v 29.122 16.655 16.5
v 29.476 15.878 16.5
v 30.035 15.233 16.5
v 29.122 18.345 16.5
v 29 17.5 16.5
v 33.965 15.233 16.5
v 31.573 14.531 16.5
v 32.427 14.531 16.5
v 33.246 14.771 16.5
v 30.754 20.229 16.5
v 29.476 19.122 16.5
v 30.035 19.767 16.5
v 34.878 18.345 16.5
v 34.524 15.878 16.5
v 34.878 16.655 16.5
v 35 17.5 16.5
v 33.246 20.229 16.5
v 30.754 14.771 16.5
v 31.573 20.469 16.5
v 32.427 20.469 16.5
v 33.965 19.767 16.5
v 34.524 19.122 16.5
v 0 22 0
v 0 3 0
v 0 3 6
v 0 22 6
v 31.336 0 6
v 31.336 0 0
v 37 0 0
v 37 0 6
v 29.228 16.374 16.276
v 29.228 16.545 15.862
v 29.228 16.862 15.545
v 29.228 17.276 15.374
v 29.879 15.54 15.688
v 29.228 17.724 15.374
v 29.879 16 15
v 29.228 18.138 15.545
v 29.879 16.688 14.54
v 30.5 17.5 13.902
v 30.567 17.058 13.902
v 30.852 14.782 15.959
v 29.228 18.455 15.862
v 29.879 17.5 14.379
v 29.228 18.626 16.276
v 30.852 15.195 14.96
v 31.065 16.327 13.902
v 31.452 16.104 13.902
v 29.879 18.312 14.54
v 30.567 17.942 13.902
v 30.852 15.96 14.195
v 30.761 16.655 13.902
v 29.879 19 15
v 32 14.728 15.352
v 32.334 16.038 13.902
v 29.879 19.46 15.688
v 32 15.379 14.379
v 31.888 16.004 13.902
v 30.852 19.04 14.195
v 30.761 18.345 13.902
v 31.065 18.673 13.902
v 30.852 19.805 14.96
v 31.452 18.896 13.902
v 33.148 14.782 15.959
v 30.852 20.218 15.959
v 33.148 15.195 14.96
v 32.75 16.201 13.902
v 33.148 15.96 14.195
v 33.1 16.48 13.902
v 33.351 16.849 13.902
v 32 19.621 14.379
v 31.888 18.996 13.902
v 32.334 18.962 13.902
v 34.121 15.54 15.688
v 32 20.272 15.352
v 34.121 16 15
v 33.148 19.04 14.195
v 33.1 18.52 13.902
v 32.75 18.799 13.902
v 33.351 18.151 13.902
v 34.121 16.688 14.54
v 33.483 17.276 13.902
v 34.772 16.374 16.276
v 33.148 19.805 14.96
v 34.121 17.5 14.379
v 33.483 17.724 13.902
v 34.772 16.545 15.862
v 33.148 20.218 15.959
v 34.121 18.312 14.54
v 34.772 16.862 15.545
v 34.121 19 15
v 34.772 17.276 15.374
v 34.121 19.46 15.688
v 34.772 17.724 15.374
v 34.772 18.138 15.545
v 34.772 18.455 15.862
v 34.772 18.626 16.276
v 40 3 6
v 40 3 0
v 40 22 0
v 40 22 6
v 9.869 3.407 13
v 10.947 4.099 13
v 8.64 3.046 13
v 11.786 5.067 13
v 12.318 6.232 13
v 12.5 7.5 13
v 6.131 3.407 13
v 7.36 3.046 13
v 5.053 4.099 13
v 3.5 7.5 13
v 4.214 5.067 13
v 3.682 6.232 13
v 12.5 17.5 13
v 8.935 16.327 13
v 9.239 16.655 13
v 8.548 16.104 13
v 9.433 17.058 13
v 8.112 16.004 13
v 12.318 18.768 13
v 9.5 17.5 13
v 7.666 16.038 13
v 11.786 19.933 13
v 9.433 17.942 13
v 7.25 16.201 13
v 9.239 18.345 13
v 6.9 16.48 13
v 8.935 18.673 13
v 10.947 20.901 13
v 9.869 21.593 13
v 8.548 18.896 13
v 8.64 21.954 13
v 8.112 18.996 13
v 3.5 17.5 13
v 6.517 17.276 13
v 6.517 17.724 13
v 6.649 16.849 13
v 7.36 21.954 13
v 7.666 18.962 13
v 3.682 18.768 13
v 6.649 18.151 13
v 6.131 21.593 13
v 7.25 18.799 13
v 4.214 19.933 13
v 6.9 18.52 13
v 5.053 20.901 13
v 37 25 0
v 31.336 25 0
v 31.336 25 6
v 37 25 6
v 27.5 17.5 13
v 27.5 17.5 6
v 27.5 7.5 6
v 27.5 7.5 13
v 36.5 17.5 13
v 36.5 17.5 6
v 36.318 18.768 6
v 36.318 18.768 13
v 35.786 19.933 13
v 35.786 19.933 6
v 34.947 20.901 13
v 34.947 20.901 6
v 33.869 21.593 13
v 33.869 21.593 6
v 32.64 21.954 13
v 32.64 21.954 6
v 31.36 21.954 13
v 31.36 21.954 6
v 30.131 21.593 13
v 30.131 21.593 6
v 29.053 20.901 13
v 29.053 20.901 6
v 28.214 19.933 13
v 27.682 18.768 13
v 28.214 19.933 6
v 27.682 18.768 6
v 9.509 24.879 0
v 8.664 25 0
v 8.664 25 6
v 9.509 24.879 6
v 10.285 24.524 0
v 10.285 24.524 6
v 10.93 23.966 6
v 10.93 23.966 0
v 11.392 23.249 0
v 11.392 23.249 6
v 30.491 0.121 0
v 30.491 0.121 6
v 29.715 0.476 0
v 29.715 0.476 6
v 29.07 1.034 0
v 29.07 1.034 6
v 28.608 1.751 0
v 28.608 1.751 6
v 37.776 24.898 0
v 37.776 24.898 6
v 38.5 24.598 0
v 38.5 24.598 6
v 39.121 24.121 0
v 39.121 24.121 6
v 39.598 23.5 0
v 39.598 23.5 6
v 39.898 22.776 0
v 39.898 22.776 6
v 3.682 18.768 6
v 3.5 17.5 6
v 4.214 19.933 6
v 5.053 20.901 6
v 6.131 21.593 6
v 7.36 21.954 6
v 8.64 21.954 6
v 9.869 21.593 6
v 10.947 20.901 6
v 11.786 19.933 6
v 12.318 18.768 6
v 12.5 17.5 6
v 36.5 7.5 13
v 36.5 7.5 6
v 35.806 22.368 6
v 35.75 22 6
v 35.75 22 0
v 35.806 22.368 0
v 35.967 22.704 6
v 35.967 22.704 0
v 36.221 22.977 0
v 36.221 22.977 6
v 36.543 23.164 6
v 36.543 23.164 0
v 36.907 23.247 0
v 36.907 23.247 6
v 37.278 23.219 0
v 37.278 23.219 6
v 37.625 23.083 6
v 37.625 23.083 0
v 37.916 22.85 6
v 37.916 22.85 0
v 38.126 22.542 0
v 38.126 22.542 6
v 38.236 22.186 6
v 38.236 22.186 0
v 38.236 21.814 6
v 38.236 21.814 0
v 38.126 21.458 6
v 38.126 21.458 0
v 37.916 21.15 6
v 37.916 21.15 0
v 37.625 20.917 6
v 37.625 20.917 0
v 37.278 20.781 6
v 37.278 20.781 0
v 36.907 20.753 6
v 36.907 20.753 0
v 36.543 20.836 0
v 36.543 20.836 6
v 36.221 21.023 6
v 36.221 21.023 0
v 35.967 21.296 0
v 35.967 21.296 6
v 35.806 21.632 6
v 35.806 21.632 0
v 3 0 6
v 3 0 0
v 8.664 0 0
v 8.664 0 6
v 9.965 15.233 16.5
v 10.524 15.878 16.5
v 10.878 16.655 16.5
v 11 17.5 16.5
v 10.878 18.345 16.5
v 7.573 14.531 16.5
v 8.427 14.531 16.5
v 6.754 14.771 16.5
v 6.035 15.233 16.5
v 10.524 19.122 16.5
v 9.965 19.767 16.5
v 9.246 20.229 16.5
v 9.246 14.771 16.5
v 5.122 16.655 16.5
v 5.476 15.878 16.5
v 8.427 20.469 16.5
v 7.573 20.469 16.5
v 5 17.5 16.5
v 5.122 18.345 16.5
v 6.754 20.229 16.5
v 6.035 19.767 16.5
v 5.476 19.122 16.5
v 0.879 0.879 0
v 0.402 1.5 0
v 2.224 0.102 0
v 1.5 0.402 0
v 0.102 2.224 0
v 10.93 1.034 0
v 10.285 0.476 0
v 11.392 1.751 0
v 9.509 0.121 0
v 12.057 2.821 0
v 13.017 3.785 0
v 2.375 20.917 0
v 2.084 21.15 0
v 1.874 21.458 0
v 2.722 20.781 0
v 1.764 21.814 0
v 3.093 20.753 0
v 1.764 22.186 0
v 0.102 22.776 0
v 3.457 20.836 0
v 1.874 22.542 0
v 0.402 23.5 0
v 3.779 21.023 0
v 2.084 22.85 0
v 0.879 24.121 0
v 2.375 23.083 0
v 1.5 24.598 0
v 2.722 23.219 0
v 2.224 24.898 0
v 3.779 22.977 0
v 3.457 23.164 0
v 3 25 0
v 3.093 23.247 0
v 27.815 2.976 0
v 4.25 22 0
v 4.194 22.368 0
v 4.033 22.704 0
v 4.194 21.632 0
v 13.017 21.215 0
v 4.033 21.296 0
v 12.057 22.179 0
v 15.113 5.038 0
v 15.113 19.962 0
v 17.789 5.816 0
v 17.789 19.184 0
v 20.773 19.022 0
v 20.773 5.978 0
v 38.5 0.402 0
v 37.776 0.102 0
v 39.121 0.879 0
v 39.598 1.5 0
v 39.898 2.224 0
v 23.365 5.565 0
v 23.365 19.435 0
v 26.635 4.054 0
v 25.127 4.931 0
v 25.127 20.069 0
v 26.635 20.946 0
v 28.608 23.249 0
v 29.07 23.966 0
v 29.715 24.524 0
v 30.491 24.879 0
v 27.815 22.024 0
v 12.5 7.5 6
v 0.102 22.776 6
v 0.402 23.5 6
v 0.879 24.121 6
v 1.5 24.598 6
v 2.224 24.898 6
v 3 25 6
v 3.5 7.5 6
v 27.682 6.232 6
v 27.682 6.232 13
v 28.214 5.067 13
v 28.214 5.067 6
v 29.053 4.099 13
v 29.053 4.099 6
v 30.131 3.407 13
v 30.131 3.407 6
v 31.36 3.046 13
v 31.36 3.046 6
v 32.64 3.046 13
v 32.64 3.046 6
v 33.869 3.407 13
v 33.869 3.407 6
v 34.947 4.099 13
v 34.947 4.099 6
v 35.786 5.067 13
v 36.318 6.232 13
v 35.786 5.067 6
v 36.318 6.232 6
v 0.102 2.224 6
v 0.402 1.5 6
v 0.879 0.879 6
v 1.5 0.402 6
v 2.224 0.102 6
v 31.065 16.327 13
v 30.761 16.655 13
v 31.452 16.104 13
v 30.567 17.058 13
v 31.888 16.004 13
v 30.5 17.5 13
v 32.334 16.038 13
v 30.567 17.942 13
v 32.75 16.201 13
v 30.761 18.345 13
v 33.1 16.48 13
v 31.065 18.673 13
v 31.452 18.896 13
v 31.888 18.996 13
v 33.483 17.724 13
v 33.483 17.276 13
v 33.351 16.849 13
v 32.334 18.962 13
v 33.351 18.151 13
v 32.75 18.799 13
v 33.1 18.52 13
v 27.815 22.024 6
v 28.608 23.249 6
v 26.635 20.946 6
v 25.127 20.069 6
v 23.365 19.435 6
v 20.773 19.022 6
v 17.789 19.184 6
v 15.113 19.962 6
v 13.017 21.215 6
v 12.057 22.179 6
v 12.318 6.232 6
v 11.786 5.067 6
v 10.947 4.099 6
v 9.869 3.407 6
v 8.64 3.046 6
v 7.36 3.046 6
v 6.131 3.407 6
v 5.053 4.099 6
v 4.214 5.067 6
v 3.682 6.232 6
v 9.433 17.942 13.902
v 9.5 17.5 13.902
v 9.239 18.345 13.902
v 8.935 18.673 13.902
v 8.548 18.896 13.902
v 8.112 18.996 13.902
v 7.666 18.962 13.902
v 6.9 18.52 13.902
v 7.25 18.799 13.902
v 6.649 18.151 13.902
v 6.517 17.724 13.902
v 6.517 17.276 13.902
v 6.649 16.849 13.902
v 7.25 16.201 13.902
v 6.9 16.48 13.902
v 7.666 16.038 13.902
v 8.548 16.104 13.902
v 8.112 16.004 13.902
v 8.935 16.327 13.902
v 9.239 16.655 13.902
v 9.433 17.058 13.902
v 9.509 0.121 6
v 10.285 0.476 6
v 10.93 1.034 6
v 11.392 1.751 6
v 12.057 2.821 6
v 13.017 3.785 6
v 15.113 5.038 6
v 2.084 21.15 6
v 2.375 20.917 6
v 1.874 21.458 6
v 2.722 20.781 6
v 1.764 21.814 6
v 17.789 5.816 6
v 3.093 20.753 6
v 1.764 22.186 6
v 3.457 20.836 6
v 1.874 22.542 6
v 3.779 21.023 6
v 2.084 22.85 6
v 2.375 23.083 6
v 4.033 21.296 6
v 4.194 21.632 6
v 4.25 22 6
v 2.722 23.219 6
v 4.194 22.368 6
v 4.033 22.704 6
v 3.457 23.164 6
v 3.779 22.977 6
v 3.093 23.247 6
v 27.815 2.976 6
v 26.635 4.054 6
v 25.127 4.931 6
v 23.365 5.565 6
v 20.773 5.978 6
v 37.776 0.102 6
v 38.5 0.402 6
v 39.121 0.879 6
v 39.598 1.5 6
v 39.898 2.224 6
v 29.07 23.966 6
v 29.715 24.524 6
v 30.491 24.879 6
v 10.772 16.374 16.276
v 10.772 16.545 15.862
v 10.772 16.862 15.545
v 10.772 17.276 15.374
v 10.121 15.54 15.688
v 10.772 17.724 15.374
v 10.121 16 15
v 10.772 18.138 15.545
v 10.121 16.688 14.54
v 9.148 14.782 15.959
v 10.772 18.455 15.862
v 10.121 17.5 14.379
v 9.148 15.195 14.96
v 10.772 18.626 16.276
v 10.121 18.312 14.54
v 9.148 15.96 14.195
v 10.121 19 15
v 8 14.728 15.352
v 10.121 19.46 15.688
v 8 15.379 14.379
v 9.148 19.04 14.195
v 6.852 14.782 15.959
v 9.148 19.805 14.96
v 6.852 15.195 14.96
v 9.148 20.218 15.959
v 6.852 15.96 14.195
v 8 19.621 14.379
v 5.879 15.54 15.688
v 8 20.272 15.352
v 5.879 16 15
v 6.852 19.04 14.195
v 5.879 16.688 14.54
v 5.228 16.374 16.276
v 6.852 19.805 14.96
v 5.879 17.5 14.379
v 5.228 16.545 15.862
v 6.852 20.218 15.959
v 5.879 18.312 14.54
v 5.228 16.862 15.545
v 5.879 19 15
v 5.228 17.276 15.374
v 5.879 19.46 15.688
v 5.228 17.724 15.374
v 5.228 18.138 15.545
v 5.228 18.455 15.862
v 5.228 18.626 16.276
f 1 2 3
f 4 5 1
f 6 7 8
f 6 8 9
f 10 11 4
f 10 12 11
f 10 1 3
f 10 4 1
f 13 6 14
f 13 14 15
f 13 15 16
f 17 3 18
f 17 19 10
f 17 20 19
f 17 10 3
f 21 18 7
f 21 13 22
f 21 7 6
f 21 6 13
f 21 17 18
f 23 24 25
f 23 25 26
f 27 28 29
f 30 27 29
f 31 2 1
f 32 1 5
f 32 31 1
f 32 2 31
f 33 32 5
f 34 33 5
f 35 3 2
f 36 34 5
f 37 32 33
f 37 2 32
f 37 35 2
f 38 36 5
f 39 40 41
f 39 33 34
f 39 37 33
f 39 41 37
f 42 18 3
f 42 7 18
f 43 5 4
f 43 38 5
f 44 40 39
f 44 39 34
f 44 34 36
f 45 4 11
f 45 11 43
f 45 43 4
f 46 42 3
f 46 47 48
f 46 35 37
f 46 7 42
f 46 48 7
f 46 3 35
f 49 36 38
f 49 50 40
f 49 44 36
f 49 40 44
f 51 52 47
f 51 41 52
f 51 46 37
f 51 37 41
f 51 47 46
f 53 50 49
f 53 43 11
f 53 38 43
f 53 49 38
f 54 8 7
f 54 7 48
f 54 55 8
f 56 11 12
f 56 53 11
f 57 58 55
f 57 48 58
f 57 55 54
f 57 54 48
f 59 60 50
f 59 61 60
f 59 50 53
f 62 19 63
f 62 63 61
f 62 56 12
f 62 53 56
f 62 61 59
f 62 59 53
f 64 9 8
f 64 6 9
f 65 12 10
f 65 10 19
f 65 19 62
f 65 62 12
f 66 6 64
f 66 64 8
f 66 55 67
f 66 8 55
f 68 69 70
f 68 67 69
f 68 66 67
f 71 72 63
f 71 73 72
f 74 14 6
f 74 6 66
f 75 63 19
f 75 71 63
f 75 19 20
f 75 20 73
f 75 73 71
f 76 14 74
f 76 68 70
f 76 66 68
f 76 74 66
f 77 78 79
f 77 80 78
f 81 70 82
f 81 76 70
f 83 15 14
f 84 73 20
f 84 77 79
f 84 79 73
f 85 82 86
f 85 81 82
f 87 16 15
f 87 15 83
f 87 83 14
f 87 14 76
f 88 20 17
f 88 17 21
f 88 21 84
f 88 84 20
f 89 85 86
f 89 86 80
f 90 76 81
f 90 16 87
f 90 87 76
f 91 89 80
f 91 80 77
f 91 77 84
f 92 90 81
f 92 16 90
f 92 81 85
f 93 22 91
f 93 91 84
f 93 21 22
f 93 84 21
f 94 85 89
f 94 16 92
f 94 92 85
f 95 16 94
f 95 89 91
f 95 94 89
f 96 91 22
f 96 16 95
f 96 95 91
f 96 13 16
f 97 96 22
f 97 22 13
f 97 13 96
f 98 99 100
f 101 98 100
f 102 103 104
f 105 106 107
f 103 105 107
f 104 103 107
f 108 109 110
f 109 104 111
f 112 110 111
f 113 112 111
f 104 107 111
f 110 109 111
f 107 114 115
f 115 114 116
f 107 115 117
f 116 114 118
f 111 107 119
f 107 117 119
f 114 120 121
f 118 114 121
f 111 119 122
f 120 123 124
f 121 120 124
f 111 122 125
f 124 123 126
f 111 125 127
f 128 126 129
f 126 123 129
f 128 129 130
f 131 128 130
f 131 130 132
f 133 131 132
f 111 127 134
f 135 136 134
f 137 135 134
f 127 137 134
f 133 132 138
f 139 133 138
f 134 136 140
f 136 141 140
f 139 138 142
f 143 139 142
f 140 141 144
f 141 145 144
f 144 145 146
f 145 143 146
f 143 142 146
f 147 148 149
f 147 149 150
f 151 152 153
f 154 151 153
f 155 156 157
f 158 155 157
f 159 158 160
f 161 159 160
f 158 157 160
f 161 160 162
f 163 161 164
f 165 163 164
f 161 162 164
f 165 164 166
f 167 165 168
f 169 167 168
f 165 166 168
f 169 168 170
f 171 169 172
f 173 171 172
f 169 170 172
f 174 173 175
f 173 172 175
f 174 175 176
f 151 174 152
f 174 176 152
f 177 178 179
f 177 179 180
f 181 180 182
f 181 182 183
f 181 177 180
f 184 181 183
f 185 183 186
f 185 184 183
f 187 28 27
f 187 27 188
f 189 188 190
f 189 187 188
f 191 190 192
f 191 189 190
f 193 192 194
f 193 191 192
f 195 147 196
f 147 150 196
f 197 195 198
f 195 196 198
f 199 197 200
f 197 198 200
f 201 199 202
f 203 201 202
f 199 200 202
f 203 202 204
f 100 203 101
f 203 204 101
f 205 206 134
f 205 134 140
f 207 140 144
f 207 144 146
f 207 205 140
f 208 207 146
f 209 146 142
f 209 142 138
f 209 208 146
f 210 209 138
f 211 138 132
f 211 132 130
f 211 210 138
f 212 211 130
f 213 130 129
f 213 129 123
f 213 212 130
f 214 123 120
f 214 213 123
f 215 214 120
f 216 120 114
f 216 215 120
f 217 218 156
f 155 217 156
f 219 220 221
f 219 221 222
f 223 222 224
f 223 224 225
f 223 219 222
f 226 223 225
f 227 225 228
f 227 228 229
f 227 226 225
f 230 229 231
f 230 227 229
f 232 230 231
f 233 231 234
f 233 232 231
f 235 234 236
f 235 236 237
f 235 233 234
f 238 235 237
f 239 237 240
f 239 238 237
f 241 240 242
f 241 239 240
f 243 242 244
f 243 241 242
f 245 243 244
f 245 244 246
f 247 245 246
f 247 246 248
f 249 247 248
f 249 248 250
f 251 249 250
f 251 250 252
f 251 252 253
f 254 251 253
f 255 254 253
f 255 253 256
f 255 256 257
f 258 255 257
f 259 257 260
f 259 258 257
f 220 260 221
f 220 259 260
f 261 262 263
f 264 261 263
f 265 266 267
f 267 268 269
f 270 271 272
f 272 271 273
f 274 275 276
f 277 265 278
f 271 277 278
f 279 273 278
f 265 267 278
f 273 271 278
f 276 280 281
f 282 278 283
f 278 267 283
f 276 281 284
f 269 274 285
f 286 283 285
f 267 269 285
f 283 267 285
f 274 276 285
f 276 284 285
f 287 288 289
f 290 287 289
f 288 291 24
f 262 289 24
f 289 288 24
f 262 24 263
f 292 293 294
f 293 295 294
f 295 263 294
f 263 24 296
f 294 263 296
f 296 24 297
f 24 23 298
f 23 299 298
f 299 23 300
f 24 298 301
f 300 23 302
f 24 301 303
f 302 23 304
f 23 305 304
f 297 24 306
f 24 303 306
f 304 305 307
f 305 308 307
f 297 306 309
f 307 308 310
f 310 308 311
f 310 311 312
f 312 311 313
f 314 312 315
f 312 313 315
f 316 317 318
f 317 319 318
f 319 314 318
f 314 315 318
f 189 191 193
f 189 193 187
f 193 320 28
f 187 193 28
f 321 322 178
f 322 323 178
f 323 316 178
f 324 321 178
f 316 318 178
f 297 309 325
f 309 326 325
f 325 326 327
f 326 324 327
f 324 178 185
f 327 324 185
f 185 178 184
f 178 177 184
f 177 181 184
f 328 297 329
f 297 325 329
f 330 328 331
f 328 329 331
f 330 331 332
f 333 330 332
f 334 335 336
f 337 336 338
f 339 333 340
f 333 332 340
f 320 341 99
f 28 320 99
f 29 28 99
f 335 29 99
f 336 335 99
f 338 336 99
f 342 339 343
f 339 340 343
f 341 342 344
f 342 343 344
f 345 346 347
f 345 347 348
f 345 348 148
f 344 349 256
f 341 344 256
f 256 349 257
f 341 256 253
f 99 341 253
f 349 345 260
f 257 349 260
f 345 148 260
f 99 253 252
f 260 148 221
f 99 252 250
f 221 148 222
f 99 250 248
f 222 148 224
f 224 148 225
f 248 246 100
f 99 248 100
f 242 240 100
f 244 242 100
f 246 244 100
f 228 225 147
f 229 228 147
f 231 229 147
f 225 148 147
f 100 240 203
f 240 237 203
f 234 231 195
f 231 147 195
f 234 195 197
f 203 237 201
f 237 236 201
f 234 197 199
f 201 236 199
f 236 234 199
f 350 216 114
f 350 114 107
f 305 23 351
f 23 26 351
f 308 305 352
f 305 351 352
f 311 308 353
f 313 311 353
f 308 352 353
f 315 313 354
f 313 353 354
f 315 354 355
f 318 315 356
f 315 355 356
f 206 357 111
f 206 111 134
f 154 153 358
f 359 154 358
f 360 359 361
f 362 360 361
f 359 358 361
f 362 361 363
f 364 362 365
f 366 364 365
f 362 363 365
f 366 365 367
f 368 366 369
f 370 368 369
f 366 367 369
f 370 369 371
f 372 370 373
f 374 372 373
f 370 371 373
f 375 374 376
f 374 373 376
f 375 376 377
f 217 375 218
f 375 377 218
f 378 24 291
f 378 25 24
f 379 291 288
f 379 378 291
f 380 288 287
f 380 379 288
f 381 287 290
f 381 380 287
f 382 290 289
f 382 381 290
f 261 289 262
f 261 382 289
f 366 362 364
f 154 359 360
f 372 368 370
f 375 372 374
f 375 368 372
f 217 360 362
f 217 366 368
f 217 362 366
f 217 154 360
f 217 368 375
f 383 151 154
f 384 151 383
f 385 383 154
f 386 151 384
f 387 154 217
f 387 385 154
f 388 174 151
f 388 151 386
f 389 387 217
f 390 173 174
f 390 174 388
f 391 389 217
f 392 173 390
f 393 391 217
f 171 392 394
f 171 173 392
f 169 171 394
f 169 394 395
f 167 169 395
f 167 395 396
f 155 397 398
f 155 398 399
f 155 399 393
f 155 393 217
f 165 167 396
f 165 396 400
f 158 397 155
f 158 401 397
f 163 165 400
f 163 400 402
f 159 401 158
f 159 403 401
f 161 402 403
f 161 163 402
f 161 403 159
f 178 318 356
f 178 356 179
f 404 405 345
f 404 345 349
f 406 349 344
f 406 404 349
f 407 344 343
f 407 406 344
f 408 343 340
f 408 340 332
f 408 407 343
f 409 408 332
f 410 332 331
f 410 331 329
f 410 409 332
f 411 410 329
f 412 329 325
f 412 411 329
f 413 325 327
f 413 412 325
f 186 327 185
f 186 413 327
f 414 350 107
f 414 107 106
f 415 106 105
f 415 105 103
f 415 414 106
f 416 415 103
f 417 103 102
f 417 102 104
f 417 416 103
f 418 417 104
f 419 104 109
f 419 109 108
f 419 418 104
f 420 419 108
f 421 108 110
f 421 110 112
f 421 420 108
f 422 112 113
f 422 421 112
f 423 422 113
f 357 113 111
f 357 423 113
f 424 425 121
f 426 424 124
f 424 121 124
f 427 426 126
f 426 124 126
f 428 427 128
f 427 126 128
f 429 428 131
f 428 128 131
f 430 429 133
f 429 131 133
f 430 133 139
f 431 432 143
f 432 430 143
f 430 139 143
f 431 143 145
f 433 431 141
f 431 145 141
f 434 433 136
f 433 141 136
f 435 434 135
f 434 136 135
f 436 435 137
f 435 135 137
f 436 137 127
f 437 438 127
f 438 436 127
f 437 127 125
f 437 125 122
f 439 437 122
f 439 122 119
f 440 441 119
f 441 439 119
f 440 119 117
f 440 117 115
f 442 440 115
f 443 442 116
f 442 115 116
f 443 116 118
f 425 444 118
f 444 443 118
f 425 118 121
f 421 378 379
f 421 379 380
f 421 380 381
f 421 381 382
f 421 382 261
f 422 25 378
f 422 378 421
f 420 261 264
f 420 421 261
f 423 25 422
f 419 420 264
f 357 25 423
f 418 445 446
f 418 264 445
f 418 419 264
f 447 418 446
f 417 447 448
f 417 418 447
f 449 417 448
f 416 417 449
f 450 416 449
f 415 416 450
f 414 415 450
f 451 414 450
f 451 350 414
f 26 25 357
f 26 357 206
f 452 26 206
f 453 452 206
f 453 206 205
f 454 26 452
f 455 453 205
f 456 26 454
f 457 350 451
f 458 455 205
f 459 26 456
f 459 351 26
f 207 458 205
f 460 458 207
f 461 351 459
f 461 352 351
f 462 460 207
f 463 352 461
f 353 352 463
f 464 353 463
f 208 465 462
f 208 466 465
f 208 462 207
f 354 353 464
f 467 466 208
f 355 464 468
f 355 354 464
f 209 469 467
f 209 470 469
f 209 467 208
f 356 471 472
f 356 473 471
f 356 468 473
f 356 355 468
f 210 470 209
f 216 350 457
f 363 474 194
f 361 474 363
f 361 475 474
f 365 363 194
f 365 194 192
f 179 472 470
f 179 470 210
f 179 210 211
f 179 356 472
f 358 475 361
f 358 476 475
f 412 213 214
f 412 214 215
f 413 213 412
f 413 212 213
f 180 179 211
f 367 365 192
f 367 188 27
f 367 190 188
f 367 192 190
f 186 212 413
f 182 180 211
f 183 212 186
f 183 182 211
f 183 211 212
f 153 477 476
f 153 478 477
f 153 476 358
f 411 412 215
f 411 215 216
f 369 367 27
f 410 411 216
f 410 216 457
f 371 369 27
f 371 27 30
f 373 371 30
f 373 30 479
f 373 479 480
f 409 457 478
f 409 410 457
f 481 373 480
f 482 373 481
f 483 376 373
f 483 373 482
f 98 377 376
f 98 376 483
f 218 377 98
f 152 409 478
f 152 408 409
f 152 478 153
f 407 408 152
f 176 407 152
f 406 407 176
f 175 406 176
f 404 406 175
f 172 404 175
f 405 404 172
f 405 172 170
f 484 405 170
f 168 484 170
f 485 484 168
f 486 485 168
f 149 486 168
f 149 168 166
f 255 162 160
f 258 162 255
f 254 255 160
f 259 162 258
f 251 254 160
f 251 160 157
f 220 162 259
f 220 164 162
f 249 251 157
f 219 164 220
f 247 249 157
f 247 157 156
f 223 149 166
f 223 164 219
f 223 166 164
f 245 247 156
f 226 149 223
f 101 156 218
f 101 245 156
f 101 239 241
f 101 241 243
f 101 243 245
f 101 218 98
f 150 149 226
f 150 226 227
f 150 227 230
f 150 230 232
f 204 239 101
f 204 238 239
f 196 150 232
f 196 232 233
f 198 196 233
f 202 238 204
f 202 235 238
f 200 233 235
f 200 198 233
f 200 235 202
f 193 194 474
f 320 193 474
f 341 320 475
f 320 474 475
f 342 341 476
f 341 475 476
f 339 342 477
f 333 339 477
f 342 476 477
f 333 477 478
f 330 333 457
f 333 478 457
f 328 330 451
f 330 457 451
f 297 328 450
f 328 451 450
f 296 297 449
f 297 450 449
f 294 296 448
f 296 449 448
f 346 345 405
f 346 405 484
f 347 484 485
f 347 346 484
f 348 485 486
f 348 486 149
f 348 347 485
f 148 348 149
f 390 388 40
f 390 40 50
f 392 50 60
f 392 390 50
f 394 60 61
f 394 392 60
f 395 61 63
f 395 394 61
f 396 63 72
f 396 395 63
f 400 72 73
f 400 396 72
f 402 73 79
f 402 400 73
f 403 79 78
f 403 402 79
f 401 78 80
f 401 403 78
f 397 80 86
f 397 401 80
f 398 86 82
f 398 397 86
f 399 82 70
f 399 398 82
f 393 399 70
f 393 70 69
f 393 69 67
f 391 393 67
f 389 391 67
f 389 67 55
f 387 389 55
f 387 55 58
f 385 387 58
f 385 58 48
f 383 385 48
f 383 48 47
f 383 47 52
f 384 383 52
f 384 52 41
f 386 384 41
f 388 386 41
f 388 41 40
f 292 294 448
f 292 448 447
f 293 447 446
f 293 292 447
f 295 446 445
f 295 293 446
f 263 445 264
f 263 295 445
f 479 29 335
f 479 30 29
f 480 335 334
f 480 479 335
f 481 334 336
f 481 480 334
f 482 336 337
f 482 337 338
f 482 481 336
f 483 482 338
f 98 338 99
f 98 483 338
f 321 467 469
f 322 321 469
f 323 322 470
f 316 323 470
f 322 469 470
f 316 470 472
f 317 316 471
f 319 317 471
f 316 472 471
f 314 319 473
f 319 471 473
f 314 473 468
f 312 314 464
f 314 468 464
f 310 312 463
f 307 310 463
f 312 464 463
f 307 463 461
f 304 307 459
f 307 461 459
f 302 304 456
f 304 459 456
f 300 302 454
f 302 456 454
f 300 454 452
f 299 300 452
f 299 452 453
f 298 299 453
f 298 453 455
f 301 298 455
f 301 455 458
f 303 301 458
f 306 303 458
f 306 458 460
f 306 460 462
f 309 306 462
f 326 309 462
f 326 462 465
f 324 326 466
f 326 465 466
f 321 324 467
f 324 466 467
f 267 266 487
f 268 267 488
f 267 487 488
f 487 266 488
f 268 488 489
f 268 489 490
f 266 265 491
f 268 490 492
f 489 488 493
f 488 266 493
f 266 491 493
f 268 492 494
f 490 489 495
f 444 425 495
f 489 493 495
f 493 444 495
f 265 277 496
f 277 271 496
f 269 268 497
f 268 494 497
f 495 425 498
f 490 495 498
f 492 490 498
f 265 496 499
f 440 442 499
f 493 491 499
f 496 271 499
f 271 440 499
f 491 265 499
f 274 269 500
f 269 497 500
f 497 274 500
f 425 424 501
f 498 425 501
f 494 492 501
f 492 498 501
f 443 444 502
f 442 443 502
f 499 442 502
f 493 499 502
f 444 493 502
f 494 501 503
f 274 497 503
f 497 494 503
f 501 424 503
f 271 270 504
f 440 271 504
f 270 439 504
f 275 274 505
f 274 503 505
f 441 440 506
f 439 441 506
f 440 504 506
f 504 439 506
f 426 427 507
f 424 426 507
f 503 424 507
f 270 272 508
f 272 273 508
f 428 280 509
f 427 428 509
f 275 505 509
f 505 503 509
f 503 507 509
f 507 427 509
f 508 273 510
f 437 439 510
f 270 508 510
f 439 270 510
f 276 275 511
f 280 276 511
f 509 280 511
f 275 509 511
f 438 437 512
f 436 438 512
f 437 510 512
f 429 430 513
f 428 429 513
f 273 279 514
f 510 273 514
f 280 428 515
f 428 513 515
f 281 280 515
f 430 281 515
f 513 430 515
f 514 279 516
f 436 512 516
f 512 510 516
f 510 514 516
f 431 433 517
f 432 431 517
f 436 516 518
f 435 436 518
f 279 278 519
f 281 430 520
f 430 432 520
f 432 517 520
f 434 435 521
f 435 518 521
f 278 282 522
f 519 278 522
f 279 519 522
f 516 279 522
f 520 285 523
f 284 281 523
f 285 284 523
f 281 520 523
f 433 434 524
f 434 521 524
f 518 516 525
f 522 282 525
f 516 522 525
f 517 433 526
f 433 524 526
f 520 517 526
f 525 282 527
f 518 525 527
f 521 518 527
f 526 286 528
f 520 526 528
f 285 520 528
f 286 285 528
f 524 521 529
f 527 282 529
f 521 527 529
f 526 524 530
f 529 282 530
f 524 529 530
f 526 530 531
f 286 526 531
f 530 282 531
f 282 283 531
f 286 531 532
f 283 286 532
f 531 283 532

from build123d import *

# Parameters (mm, degrees)
SKIZZE1_W                       = 40
SKIZZE1_H                       = 25
AUFSATZ_LINEAR_AUSTRAGEN1_DEPTH = 6
AUFSATZ_LINEAR_AUSTRAGEN2_DEPTH = 7
SKIZZE3_R                       = 1.5
AUFSATZ_LINEAR_AUSTRAGEN3_DEPTH = 3.5
ROTATION1_ANGLE                 = 180
VERRUNDUNG1_R                   = 3
SKIZZE6_RX                      = 9
SKIZZE6_RY                      = 6
SCHNITT_LINEAR_AUSTRAGEN7_DEPTH = 6
VERRUNDUNG2_START               = -1
VERRUNDUNG2_DEPTH               = 8
VERRUNDUNG3_START               = -1
VERRUNDUNG3_DEPTH               = 8
SKIZZE7_R                       = 1.25
SCHNITT_LINEAR_AUSTRAGEN8_DEPTH = 6


with BuildPart() as part:
    # Skizze1 → Aufsatz-Linear austragen1 (new body)
    with BuildSketch(Plane.XY):
        with Locations((20, 12.5)):
            Rectangle(SKIZZE1_W, SKIZZE1_H)
    extrude(amount=AUFSATZ_LINEAR_AUSTRAGEN1_DEPTH)

    # Skizze2 → Aufsatz-Linear austragen2 (add)
    with BuildSketch(Plane.XY.offset(6)):
        with BuildLine():
            Line((12.5, 17.5), (12.5, 7.5))
            ThreePointArc((12.5, 7.5), (8, 3), (3.5, 7.5))
            Line((3.5, 7.5), (3.5, 17.5))
            ThreePointArc((3.5, 17.5), (8, 22), (12.5, 17.5))
        make_face()
    aufsatz_linear_austragen2 = extrude(amount=AUFSATZ_LINEAR_AUSTRAGEN2_DEPTH)

    # Spiegeln1: Aufsatz-Linear austragen2 across plane
    add(aufsatz_linear_austragen2.mirror(Plane.ZY.offset(-20)))

    # Skizze3 → Aufsatz-Linear austragen3 (add)
    with BuildSketch(Plane.XY.offset(13)):
        with Locations((8, 17.5)):
            Circle(SKIZZE3_R)
    aufsatz_linear_austragen3 = extrude(amount=AUFSATZ_LINEAR_AUSTRAGEN3_DEPTH)

    # Spiegeln2: Aufsatz-Linear austragen3 across plane
    add(aufsatz_linear_austragen3.mirror(Plane.ZY.offset(-20)))

    # Skizze4 → Rotation1 (revolve)
    with BuildSketch(Plane.XY.offset(16.5)):
        with BuildLine():
            Line((5, 17.5), (11, 17.5))
            ThreePointArc((11, 17.5), (8, 14.5), (5, 17.5))
        make_face()
    rotation1 = revolve(axis=Axis((5, 17.5, 16.5), (1, 0, 0)), revolution_arc=ROTATION1_ANGLE)

    # Spiegeln3: Rotation1 across plane
    add(rotation1.mirror(Plane.ZY.offset(-20)))

    # Verrundung1
    verrundung1_edges = [part.edges().sort_by_distance(p)[0] for p in [
        (0, 25, 3),
        (40, 25, 3),
        (40, 0, 3),
        (0, 0, 3),
    ]]
    fillet(verrundung1_edges, radius=VERRUNDUNG1_R)

    # Skizze6 → Schnitt-Linear austragen7 (cut)
    with BuildSketch(Plane.XY.offset(6)):
        with Locations(Location((20, 0), (0, 0, 180))):
            Ellipse(SKIZZE6_RX, SKIZZE6_RY)
    schnitt_linear_austragen7 = extrude(amount=-SCHNITT_LINEAR_AUSTRAGEN7_DEPTH, mode=Mode.SUBTRACT)

    # Verrundung2: read off the stored shape, not the designer's step
    # Verrundung2 outline → Verrundung2 (cut)
    with BuildSketch(Plane.XY.offset(VERRUNDUNG2_START)):
        with BuildLine():
            add(Edge.make_bspline(
                [(11.391923436, 1.751319232), (11, 0.89515019), (11, 0)],
                knots=[5.971053557, 5.971053557, 5.971053557, 6.283185307, 6.283185307, 6.283185307], degree=2, weights=[0.906728811, 0.94179941, 1]))
            ThreePointArc((11.391923436, 1.751319232), (10.28493687, 0.475515666), (8.664141124, 0))
            Line((8.664141124, 0), (11, 0))
        make_face()
        with BuildLine():
            ThreePointArc((31.335858876, 0), (29.71506313, 0.475515666), (28.608076564, 1.751319232))
            add(Edge.make_bspline(
                [(29, 0), (29, 0.89515019), (28.608076564, 1.751319232)],
                knots=[3.141592654, 3.141592654, 3.141592654, 3.453724403, 3.453724403, 3.453724403], degree=2, weights=[1, 0.94179941, 0.906728811]))
            Line((29, 0), (31.335858876, 0))
        make_face()
    extrude(amount=VERRUNDUNG2_DEPTH, mode=Mode.SUBTRACT)

    # Spiegeln5: Schnitt-Linear austragen7 across plane
    add(schnitt_linear_austragen7.mirror(Plane.ZX.offset(12.5)), mode=Mode.SUBTRACT)

    # Verrundung3: read off the stored shape, not the designer's step
    # Verrundung3 outline → Verrundung3 (cut)
    with BuildSketch(Plane.XY.offset(VERRUNDUNG3_START)):
        with BuildLine():
            ThreePointArc((8.664141124, 25), (10.28493687, 24.524484334), (11.391923436, 23.248680768))
            add(Edge.make_bspline(
                [(11.391923436, 23.248680768), (11, 24.10484981), (11, 25)],
                knots=[5.971053557, 5.971053557, 5.971053557, 6.283185307, 6.283185307, 6.283185307], degree=2, weights=[0.906728811, 0.94179941, 1]))
            Line((11, 25), (8.664141124, 25))
        make_face()
        with BuildLine():
            ThreePointArc((28.608076564, 23.248680768), (29.71506313, 24.524484334), (31.335858876, 25))
            Line((31.335858876, 25), (29, 25))
            add(Edge.make_bspline(
                [(29, 25), (29, 24.10484981), (28.608076564, 23.248680768)],
                knots=[3.141592654, 3.141592654, 3.141592654, 3.453724403, 3.453724403, 3.453724403], degree=2, weights=[1, 0.94179941, 0.906728811]))
        make_face()
    extrude(amount=VERRUNDUNG3_DEPTH, mode=Mode.SUBTRACT)

    # Skizze7 → Schnitt-Linear austragen8 (cut)
    with BuildSketch(Plane.XY.offset(6)):
        with Locations((3, 22)):
            Circle(SKIZZE7_R)
    schnitt_linear_austragen8 = extrude(amount=-SCHNITT_LINEAR_AUSTRAGEN8_DEPTH, mode=Mode.SUBTRACT)

    # Spiegeln6: Schnitt-Linear austragen8 across plane
    add(schnitt_linear_austragen8.mirror(Plane.ZY.offset(-20)), mode=Mode.SUBTRACT)


solid = part.part
